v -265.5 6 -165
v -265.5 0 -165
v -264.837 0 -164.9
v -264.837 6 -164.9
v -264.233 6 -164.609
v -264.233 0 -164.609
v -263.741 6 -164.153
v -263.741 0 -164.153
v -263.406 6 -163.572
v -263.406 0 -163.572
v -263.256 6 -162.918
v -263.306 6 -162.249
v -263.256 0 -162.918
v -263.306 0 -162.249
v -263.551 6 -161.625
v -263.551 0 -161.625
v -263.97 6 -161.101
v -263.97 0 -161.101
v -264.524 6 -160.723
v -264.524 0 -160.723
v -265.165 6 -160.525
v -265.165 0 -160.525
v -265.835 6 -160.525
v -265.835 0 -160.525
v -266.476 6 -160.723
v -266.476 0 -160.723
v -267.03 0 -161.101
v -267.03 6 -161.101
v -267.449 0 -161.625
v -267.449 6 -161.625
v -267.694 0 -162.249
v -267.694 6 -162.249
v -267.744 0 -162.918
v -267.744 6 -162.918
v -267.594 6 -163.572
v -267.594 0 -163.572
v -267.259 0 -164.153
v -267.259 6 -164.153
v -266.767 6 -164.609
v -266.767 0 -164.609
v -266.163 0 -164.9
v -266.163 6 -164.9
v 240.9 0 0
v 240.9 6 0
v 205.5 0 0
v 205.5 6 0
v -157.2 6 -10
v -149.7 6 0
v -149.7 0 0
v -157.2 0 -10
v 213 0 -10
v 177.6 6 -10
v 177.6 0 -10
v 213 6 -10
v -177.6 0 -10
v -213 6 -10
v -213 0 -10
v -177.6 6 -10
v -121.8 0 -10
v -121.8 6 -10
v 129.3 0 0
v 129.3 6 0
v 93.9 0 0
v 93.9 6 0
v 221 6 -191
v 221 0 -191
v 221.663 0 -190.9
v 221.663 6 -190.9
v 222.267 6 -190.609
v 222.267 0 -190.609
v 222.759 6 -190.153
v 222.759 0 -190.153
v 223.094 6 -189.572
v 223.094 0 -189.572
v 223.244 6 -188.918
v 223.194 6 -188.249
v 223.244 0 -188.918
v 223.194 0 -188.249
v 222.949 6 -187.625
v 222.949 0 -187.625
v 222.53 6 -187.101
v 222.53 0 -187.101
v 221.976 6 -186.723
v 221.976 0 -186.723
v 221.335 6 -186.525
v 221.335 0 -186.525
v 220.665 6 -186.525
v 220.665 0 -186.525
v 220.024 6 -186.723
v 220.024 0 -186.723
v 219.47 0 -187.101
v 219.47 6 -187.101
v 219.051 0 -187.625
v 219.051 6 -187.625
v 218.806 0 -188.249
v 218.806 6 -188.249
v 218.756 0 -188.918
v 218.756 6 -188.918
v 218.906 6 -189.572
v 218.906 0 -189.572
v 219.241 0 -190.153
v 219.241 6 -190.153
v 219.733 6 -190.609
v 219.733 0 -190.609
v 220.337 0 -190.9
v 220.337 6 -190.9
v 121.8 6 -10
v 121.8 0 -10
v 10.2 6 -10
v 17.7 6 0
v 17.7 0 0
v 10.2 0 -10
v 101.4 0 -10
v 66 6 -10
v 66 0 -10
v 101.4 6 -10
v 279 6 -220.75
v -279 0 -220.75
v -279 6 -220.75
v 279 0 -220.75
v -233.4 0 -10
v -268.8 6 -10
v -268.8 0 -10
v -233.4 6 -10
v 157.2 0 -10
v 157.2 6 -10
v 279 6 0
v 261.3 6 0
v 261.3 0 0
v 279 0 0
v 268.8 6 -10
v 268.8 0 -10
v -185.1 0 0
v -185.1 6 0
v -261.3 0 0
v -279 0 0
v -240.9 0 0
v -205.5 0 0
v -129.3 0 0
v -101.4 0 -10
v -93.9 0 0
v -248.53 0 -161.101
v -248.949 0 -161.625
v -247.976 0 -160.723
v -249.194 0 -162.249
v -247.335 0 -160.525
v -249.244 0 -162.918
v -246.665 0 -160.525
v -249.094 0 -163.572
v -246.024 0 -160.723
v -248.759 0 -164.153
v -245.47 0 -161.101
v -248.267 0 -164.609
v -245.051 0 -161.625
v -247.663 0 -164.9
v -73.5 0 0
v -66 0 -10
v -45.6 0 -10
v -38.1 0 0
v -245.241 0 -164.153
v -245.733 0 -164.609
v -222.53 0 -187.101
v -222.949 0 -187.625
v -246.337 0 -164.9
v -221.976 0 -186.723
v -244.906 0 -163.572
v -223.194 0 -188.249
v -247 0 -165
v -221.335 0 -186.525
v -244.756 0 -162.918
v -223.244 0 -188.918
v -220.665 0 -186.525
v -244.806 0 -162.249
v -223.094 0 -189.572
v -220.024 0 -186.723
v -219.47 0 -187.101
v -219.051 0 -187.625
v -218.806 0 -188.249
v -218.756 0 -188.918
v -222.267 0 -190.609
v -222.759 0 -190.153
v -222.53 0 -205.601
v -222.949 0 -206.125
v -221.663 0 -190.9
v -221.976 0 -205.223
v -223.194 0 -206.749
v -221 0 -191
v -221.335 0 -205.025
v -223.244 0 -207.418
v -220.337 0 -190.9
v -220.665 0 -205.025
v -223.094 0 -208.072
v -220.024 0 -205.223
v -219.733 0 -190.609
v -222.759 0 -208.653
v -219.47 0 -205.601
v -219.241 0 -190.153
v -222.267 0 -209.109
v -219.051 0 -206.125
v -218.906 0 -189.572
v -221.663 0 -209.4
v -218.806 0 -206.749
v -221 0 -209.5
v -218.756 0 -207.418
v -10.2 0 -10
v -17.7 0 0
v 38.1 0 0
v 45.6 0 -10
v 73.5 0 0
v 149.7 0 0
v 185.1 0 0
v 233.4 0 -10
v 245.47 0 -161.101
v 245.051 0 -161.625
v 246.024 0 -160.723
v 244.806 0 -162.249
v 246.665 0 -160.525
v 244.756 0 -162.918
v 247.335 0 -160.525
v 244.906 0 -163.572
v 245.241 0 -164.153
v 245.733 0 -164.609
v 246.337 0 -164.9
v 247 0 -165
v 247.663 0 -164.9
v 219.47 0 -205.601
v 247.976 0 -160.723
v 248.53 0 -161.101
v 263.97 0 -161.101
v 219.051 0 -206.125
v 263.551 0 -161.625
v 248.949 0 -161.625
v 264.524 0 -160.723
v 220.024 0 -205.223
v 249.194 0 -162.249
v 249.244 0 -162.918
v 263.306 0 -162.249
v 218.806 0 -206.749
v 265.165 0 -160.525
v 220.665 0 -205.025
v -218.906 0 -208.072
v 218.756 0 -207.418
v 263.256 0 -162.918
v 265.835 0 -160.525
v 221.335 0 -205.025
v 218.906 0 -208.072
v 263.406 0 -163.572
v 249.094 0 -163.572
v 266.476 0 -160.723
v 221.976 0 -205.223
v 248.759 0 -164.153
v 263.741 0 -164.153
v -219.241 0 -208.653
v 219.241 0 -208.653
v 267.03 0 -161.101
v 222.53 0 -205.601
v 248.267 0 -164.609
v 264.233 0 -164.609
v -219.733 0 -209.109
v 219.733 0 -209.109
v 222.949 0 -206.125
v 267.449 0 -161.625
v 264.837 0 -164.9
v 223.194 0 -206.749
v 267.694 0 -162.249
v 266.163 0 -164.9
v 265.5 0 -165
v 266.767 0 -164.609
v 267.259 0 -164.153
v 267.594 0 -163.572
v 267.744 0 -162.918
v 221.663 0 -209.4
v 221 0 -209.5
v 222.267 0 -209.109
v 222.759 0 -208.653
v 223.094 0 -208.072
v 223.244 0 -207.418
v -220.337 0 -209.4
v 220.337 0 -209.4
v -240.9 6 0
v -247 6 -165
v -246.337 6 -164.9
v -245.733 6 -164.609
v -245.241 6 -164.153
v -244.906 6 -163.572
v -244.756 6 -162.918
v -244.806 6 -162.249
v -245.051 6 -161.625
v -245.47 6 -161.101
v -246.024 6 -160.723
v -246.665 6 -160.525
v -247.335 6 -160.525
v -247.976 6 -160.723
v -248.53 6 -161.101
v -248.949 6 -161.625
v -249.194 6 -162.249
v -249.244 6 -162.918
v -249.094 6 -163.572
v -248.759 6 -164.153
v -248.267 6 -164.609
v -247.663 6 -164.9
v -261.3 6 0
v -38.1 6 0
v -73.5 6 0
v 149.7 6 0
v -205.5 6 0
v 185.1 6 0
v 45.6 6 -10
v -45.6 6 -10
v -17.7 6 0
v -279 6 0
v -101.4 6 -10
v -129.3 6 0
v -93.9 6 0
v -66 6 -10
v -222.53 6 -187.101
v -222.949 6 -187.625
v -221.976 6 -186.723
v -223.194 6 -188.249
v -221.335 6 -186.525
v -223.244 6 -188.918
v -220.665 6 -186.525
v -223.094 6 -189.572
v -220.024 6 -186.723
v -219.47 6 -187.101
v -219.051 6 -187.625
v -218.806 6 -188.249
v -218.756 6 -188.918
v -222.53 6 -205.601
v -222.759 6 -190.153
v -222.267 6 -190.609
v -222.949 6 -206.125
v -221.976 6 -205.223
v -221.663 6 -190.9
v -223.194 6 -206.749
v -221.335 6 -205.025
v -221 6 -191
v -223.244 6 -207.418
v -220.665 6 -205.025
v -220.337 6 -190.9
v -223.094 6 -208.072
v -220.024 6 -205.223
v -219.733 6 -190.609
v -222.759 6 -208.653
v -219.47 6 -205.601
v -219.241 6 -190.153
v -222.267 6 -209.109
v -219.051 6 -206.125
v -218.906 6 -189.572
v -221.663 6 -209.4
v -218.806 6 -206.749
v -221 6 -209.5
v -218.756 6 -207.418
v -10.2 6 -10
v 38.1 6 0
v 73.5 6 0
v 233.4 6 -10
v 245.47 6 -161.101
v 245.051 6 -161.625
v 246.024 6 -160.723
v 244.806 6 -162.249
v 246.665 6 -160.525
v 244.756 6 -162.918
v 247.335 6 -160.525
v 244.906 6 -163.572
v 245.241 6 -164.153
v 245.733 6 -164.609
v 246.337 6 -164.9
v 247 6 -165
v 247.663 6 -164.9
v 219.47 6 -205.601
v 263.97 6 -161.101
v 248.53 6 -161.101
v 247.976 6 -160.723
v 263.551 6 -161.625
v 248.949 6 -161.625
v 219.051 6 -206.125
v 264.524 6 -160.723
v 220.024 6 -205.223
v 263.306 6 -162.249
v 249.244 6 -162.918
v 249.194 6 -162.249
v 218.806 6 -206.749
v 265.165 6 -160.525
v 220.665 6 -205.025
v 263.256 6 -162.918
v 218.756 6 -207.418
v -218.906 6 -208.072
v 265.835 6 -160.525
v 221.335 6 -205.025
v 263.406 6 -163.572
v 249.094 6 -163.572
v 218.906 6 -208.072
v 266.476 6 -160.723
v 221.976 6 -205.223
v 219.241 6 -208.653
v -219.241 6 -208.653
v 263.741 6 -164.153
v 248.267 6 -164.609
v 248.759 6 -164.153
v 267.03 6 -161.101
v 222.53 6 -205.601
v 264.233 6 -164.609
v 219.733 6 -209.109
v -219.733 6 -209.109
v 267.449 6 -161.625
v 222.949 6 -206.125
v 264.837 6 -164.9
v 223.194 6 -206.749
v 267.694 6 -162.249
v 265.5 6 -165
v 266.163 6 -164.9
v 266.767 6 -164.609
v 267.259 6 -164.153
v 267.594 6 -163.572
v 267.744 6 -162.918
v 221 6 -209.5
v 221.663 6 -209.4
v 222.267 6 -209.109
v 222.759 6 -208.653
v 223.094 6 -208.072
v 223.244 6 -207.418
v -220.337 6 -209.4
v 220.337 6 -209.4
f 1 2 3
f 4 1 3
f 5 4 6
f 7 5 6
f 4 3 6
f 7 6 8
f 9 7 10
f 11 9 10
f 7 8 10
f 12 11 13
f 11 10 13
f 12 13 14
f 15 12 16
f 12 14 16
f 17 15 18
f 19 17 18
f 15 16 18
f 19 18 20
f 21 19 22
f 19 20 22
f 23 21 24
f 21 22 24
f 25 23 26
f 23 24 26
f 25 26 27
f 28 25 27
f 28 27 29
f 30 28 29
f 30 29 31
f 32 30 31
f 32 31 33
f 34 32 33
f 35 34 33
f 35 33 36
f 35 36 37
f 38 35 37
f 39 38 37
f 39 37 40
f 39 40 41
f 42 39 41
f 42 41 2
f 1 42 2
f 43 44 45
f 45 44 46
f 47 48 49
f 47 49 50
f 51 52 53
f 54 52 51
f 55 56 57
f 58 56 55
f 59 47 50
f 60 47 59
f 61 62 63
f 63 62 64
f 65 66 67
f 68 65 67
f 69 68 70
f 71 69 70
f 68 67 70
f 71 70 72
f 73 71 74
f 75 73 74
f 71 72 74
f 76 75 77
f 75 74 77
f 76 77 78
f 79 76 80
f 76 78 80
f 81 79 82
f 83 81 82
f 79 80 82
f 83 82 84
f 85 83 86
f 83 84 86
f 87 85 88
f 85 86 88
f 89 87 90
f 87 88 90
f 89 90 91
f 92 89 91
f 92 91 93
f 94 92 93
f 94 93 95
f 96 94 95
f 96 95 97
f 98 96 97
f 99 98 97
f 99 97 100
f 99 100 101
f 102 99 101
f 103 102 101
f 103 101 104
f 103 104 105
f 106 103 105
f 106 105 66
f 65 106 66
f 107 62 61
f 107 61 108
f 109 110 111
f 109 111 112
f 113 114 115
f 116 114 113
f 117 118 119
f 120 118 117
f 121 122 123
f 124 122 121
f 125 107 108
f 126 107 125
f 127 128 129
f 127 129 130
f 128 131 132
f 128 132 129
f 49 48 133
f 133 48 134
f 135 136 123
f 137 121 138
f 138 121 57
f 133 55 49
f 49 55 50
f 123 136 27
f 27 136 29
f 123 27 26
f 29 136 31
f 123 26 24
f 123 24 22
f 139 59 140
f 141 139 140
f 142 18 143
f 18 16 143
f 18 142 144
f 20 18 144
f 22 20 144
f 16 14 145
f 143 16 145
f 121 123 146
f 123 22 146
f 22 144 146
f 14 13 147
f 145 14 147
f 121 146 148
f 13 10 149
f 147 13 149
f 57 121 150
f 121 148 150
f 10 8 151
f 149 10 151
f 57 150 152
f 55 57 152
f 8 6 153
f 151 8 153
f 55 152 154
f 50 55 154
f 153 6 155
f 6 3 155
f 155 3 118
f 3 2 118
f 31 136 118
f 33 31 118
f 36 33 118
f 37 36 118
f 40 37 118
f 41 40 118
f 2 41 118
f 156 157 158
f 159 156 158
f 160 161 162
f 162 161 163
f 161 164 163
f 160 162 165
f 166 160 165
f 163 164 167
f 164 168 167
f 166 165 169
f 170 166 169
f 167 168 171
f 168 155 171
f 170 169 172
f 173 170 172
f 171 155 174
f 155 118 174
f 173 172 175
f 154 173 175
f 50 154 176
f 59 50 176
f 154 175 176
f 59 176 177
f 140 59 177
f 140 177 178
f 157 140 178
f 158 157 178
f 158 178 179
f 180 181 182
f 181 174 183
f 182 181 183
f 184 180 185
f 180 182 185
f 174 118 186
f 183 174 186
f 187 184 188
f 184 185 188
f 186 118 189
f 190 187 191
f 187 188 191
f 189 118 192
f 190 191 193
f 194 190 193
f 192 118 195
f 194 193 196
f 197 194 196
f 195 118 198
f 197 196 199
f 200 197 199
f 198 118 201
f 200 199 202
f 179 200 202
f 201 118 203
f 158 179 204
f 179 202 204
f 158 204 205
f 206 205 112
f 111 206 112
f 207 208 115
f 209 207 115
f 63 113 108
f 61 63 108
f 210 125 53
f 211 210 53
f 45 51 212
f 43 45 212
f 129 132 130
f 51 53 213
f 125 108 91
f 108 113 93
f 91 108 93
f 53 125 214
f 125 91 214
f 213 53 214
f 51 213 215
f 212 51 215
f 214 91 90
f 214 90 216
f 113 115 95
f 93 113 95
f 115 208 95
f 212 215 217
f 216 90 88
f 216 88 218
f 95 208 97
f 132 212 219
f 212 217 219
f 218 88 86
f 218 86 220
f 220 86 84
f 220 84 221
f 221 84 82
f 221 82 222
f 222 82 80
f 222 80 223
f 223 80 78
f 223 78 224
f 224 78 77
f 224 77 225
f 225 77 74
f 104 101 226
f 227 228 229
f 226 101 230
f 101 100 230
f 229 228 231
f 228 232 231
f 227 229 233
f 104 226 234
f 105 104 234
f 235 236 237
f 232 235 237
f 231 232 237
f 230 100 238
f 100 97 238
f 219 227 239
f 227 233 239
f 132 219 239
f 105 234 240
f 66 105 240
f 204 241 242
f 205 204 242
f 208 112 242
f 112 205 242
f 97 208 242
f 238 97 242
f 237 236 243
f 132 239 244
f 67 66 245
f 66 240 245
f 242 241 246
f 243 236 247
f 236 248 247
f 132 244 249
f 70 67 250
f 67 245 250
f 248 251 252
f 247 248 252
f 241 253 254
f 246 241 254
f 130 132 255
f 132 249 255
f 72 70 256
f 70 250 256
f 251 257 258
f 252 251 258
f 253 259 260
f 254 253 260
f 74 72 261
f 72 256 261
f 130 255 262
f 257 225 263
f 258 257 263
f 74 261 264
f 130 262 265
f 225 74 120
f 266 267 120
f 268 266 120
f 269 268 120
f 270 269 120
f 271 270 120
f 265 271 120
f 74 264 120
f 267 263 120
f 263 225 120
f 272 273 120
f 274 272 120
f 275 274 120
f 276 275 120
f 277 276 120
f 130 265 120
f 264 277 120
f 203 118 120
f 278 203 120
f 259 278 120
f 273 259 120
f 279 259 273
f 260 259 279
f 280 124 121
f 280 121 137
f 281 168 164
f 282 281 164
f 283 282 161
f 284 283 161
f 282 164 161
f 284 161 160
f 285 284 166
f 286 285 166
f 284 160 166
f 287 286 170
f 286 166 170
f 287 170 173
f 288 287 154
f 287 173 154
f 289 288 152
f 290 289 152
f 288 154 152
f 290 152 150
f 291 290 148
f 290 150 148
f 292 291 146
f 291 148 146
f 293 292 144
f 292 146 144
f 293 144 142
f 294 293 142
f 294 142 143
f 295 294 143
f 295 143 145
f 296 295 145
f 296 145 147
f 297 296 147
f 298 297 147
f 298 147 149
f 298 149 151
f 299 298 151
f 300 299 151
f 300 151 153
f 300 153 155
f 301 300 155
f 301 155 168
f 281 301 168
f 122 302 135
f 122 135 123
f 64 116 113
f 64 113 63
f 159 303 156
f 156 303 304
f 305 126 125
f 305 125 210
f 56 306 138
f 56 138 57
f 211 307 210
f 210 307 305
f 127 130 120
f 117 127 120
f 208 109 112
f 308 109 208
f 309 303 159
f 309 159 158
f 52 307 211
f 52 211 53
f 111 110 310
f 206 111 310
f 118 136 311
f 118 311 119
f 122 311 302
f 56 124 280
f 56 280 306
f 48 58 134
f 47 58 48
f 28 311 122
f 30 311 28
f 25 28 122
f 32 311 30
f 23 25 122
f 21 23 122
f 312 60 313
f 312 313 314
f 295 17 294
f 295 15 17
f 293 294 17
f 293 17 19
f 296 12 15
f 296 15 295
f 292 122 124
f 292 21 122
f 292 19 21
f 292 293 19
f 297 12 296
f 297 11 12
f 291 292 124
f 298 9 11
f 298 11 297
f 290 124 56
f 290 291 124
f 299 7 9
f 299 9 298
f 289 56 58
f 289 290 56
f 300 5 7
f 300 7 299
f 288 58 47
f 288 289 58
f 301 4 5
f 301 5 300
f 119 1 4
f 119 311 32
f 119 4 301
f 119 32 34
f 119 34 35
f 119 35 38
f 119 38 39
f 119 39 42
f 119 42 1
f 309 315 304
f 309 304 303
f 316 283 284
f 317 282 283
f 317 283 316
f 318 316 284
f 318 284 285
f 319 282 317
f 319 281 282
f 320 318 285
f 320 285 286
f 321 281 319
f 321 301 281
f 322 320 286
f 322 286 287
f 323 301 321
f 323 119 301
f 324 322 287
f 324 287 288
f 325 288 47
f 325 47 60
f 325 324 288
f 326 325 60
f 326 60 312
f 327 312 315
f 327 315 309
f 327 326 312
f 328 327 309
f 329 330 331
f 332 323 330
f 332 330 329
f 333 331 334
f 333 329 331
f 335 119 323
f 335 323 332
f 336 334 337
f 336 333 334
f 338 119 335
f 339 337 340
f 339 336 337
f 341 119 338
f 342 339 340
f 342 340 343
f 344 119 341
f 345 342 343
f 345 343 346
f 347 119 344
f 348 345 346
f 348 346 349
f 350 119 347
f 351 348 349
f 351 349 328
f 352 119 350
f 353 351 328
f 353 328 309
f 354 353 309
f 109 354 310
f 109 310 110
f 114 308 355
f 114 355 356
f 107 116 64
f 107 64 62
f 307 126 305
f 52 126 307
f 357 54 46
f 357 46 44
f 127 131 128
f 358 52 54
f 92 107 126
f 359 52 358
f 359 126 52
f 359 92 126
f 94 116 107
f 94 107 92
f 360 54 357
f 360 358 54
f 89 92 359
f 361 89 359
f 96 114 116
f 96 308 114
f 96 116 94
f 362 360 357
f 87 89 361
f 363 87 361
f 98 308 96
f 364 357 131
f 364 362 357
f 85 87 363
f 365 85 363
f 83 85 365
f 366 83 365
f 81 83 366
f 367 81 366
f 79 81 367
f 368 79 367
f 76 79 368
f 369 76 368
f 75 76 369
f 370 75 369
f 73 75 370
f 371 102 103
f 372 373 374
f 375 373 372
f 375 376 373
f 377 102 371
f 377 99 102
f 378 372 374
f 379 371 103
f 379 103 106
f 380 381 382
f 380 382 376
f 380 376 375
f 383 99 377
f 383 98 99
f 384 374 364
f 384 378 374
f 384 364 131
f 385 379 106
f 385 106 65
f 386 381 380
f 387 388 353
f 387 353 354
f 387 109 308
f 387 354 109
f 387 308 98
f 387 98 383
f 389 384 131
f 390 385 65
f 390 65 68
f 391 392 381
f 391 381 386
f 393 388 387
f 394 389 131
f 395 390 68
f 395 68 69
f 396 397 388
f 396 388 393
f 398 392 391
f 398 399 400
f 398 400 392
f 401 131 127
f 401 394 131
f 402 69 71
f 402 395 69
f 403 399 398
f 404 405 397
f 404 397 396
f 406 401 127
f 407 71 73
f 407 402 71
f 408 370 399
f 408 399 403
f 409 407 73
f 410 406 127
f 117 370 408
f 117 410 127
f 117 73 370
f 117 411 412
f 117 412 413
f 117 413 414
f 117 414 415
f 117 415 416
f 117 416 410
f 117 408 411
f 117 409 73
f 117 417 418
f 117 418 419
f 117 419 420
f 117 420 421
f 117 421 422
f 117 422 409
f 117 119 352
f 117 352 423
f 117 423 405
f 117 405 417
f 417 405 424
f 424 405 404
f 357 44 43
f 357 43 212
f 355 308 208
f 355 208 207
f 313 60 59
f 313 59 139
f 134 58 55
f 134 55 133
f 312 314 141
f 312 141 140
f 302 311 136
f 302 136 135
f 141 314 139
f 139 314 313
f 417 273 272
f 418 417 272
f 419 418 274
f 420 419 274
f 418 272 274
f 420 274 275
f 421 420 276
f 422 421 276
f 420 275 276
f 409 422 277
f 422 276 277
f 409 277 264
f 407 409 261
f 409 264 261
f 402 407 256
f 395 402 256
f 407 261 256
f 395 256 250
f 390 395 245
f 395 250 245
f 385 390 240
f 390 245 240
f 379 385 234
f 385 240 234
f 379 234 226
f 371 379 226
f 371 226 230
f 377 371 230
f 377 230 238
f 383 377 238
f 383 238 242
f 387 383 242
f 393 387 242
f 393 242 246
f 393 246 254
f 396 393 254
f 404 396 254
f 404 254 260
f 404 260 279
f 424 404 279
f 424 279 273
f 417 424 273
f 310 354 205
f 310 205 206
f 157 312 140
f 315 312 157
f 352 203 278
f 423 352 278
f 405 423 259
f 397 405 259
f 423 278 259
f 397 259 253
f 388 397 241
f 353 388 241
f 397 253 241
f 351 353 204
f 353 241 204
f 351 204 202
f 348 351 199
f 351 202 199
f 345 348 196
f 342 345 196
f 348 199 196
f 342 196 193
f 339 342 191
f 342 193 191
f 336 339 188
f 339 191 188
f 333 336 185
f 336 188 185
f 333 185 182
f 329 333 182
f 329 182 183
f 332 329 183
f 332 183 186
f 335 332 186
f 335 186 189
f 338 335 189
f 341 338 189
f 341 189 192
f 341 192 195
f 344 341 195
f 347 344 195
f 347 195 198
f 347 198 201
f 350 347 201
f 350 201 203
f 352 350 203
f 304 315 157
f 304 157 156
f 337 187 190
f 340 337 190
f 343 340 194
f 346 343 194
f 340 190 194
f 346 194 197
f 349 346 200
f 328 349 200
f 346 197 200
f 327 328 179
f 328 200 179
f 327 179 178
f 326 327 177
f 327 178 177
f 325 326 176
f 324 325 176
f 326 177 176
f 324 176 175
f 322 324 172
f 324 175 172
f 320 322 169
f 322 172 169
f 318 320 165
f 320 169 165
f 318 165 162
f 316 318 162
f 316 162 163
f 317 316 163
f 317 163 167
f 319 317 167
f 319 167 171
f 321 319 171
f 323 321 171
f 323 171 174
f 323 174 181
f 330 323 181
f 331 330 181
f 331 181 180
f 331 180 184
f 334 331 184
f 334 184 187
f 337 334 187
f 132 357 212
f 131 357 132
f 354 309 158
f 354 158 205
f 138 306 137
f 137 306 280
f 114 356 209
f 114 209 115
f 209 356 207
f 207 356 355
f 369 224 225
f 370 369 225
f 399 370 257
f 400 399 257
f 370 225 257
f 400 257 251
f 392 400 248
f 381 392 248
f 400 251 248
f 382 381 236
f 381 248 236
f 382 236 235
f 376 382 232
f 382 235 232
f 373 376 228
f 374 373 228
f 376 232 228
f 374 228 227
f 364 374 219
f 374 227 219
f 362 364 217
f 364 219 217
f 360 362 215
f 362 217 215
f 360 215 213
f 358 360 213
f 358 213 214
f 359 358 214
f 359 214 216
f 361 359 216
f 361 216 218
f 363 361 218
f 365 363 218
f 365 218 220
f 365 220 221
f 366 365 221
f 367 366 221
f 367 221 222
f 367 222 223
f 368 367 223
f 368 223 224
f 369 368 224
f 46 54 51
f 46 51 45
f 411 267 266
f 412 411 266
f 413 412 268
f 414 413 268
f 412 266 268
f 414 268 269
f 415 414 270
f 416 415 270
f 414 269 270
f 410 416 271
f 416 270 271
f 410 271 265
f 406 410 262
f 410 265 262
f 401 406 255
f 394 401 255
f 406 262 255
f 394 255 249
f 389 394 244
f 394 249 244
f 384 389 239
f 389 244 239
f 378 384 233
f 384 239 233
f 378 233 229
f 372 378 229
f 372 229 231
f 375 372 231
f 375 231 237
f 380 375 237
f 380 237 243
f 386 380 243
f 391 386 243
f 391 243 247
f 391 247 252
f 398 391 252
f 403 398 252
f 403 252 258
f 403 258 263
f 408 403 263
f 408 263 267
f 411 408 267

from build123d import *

# Parameters (mm, degrees)
SCHIZZO1_W                   = 558
SCHIZZO1_H                   = 441.5
ESTRUSIONE_ESTRUSIONE1_DEPTH = 6
SCHIZZO2_R                   = 2.25
TAGLIO_ESTRUSIONE1_DEPTH     = 10
TAGLIO_ESTRUSIONE2_DEPTH     = 10


with BuildPart() as part:
    # Schizzo1 → Estrusione-Estrusione1 (new body)
    with BuildSketch(Plane(origin=(0, 0, 0), x_dir=(1, 0, 0), z_dir=(0, 1, 0))):
        Rectangle(SCHIZZO1_W, SCHIZZO1_H)
    extrude(amount=ESTRUSIONE_ESTRUSIONE1_DEPTH)

    # Schizzo2 → Taglio-Estrusione1 (cut)
    with BuildSketch(Plane(origin=(0, 0, 0), x_dir=(-1, 0, 0), z_dir=(0, -1, 0))):
        with Locations(Location((-221, 207.25, 0), (0, 0, 90))):
            Circle(SCHIZZO2_R)
        with Locations(Location((-221, 188.75, 0), (0, 0, 90))):
            Circle(SCHIZZO2_R)
        with Locations(Location((-247, 162.75, 0), (0, 0, 90))):
            Circle(SCHIZZO2_R)
        with Locations(Location((-265.5, 162.75, 0), (0, 0, 90))):
            Circle(SCHIZZO2_R)
        with Locations(Location((221, 207.25, 0), (0, 0, 90))):
            Circle(SCHIZZO2_R)
        with Locations(Location((221, 188.75, 0), (0, 0, 90))):
            Circle(SCHIZZO2_R)
        with Locations(Location((247, 162.75, 0), (0, 0, 90))):
            Circle(SCHIZZO2_R)
        with Locations(Location((265.5, 162.75, 0), (0, 0, 90))):
            Circle(SCHIZZO2_R)
        with Locations(Location((265.5, -162.75, 0), (0, 0, 90))):
            Circle(SCHIZZO2_R)
        with Locations(Location((247, -162.75, 0), (0, 0, 90))):
            Circle(SCHIZZO2_R)
        with Locations(Location((-265.5, -162.75, 0), (0, 0, 90))):
            Circle(SCHIZZO2_R)
        with Locations(Location((-247, -162.75, 0), (0, 0, 90))):
            Circle(SCHIZZO2_R)
        with Locations(Location((-87.5, -195.25, 0), (0, 0, 90))):
            Circle(SCHIZZO2_R)
    extrude(amount=-TAGLIO_ESTRUSIONE1_DEPTH, mode=Mode.SUBTRACT)

    # Schizzo3 → Taglio-Estrusione2 (cut)
    with BuildSketch(Plane(origin=(0, 6, 0), x_dir=(1, 0, 0), z_dir=(0, 1, 0))):
        Polygon((-279, 0), (-261.3, 0), (-268.8, 10), (-233.4, 10), (-240.9, 0), (-223.2, 0), (-205.5, 0), (-213, 10), (-177.6, 10), (-185.1, 0), (-167.4, 0), (-149.7, 0), (-157.2, 10), (-121.8, 10), (-129.3, 0), (-111.6, 0), (-93.9, 0), (-101.4, 10), (-66, 10), (-73.5, 0), (-55.8, 0), (-38.1, 0), (-45.6, 10), (-10.2, 10), (-17.7, 0), (0, 0), (17.7, 0), (10.2, 10), (45.6, 10), (38.1, 0), (55.8, 0), (73.5, 0), (66, 10), (101.4, 10), (93.9, 0), (111.6, 0), (129.3, 0), (121.8, 10), (157.2, 10), (149.7, 0), (167.4, 0), (185.1, 0), (177.6, 10), (213, 10), (205.5, 0), (223.2, 0), (240.9, 0), (233.4, 10), (268.8, 10), (261.3, 0), (279, 0), (279, -220.75), (-279, -220.75), align=None)
    extrude(amount=-TAGLIO_ESTRUSIONE2_DEPTH, mode=Mode.SUBTRACT)


solid = part.part
